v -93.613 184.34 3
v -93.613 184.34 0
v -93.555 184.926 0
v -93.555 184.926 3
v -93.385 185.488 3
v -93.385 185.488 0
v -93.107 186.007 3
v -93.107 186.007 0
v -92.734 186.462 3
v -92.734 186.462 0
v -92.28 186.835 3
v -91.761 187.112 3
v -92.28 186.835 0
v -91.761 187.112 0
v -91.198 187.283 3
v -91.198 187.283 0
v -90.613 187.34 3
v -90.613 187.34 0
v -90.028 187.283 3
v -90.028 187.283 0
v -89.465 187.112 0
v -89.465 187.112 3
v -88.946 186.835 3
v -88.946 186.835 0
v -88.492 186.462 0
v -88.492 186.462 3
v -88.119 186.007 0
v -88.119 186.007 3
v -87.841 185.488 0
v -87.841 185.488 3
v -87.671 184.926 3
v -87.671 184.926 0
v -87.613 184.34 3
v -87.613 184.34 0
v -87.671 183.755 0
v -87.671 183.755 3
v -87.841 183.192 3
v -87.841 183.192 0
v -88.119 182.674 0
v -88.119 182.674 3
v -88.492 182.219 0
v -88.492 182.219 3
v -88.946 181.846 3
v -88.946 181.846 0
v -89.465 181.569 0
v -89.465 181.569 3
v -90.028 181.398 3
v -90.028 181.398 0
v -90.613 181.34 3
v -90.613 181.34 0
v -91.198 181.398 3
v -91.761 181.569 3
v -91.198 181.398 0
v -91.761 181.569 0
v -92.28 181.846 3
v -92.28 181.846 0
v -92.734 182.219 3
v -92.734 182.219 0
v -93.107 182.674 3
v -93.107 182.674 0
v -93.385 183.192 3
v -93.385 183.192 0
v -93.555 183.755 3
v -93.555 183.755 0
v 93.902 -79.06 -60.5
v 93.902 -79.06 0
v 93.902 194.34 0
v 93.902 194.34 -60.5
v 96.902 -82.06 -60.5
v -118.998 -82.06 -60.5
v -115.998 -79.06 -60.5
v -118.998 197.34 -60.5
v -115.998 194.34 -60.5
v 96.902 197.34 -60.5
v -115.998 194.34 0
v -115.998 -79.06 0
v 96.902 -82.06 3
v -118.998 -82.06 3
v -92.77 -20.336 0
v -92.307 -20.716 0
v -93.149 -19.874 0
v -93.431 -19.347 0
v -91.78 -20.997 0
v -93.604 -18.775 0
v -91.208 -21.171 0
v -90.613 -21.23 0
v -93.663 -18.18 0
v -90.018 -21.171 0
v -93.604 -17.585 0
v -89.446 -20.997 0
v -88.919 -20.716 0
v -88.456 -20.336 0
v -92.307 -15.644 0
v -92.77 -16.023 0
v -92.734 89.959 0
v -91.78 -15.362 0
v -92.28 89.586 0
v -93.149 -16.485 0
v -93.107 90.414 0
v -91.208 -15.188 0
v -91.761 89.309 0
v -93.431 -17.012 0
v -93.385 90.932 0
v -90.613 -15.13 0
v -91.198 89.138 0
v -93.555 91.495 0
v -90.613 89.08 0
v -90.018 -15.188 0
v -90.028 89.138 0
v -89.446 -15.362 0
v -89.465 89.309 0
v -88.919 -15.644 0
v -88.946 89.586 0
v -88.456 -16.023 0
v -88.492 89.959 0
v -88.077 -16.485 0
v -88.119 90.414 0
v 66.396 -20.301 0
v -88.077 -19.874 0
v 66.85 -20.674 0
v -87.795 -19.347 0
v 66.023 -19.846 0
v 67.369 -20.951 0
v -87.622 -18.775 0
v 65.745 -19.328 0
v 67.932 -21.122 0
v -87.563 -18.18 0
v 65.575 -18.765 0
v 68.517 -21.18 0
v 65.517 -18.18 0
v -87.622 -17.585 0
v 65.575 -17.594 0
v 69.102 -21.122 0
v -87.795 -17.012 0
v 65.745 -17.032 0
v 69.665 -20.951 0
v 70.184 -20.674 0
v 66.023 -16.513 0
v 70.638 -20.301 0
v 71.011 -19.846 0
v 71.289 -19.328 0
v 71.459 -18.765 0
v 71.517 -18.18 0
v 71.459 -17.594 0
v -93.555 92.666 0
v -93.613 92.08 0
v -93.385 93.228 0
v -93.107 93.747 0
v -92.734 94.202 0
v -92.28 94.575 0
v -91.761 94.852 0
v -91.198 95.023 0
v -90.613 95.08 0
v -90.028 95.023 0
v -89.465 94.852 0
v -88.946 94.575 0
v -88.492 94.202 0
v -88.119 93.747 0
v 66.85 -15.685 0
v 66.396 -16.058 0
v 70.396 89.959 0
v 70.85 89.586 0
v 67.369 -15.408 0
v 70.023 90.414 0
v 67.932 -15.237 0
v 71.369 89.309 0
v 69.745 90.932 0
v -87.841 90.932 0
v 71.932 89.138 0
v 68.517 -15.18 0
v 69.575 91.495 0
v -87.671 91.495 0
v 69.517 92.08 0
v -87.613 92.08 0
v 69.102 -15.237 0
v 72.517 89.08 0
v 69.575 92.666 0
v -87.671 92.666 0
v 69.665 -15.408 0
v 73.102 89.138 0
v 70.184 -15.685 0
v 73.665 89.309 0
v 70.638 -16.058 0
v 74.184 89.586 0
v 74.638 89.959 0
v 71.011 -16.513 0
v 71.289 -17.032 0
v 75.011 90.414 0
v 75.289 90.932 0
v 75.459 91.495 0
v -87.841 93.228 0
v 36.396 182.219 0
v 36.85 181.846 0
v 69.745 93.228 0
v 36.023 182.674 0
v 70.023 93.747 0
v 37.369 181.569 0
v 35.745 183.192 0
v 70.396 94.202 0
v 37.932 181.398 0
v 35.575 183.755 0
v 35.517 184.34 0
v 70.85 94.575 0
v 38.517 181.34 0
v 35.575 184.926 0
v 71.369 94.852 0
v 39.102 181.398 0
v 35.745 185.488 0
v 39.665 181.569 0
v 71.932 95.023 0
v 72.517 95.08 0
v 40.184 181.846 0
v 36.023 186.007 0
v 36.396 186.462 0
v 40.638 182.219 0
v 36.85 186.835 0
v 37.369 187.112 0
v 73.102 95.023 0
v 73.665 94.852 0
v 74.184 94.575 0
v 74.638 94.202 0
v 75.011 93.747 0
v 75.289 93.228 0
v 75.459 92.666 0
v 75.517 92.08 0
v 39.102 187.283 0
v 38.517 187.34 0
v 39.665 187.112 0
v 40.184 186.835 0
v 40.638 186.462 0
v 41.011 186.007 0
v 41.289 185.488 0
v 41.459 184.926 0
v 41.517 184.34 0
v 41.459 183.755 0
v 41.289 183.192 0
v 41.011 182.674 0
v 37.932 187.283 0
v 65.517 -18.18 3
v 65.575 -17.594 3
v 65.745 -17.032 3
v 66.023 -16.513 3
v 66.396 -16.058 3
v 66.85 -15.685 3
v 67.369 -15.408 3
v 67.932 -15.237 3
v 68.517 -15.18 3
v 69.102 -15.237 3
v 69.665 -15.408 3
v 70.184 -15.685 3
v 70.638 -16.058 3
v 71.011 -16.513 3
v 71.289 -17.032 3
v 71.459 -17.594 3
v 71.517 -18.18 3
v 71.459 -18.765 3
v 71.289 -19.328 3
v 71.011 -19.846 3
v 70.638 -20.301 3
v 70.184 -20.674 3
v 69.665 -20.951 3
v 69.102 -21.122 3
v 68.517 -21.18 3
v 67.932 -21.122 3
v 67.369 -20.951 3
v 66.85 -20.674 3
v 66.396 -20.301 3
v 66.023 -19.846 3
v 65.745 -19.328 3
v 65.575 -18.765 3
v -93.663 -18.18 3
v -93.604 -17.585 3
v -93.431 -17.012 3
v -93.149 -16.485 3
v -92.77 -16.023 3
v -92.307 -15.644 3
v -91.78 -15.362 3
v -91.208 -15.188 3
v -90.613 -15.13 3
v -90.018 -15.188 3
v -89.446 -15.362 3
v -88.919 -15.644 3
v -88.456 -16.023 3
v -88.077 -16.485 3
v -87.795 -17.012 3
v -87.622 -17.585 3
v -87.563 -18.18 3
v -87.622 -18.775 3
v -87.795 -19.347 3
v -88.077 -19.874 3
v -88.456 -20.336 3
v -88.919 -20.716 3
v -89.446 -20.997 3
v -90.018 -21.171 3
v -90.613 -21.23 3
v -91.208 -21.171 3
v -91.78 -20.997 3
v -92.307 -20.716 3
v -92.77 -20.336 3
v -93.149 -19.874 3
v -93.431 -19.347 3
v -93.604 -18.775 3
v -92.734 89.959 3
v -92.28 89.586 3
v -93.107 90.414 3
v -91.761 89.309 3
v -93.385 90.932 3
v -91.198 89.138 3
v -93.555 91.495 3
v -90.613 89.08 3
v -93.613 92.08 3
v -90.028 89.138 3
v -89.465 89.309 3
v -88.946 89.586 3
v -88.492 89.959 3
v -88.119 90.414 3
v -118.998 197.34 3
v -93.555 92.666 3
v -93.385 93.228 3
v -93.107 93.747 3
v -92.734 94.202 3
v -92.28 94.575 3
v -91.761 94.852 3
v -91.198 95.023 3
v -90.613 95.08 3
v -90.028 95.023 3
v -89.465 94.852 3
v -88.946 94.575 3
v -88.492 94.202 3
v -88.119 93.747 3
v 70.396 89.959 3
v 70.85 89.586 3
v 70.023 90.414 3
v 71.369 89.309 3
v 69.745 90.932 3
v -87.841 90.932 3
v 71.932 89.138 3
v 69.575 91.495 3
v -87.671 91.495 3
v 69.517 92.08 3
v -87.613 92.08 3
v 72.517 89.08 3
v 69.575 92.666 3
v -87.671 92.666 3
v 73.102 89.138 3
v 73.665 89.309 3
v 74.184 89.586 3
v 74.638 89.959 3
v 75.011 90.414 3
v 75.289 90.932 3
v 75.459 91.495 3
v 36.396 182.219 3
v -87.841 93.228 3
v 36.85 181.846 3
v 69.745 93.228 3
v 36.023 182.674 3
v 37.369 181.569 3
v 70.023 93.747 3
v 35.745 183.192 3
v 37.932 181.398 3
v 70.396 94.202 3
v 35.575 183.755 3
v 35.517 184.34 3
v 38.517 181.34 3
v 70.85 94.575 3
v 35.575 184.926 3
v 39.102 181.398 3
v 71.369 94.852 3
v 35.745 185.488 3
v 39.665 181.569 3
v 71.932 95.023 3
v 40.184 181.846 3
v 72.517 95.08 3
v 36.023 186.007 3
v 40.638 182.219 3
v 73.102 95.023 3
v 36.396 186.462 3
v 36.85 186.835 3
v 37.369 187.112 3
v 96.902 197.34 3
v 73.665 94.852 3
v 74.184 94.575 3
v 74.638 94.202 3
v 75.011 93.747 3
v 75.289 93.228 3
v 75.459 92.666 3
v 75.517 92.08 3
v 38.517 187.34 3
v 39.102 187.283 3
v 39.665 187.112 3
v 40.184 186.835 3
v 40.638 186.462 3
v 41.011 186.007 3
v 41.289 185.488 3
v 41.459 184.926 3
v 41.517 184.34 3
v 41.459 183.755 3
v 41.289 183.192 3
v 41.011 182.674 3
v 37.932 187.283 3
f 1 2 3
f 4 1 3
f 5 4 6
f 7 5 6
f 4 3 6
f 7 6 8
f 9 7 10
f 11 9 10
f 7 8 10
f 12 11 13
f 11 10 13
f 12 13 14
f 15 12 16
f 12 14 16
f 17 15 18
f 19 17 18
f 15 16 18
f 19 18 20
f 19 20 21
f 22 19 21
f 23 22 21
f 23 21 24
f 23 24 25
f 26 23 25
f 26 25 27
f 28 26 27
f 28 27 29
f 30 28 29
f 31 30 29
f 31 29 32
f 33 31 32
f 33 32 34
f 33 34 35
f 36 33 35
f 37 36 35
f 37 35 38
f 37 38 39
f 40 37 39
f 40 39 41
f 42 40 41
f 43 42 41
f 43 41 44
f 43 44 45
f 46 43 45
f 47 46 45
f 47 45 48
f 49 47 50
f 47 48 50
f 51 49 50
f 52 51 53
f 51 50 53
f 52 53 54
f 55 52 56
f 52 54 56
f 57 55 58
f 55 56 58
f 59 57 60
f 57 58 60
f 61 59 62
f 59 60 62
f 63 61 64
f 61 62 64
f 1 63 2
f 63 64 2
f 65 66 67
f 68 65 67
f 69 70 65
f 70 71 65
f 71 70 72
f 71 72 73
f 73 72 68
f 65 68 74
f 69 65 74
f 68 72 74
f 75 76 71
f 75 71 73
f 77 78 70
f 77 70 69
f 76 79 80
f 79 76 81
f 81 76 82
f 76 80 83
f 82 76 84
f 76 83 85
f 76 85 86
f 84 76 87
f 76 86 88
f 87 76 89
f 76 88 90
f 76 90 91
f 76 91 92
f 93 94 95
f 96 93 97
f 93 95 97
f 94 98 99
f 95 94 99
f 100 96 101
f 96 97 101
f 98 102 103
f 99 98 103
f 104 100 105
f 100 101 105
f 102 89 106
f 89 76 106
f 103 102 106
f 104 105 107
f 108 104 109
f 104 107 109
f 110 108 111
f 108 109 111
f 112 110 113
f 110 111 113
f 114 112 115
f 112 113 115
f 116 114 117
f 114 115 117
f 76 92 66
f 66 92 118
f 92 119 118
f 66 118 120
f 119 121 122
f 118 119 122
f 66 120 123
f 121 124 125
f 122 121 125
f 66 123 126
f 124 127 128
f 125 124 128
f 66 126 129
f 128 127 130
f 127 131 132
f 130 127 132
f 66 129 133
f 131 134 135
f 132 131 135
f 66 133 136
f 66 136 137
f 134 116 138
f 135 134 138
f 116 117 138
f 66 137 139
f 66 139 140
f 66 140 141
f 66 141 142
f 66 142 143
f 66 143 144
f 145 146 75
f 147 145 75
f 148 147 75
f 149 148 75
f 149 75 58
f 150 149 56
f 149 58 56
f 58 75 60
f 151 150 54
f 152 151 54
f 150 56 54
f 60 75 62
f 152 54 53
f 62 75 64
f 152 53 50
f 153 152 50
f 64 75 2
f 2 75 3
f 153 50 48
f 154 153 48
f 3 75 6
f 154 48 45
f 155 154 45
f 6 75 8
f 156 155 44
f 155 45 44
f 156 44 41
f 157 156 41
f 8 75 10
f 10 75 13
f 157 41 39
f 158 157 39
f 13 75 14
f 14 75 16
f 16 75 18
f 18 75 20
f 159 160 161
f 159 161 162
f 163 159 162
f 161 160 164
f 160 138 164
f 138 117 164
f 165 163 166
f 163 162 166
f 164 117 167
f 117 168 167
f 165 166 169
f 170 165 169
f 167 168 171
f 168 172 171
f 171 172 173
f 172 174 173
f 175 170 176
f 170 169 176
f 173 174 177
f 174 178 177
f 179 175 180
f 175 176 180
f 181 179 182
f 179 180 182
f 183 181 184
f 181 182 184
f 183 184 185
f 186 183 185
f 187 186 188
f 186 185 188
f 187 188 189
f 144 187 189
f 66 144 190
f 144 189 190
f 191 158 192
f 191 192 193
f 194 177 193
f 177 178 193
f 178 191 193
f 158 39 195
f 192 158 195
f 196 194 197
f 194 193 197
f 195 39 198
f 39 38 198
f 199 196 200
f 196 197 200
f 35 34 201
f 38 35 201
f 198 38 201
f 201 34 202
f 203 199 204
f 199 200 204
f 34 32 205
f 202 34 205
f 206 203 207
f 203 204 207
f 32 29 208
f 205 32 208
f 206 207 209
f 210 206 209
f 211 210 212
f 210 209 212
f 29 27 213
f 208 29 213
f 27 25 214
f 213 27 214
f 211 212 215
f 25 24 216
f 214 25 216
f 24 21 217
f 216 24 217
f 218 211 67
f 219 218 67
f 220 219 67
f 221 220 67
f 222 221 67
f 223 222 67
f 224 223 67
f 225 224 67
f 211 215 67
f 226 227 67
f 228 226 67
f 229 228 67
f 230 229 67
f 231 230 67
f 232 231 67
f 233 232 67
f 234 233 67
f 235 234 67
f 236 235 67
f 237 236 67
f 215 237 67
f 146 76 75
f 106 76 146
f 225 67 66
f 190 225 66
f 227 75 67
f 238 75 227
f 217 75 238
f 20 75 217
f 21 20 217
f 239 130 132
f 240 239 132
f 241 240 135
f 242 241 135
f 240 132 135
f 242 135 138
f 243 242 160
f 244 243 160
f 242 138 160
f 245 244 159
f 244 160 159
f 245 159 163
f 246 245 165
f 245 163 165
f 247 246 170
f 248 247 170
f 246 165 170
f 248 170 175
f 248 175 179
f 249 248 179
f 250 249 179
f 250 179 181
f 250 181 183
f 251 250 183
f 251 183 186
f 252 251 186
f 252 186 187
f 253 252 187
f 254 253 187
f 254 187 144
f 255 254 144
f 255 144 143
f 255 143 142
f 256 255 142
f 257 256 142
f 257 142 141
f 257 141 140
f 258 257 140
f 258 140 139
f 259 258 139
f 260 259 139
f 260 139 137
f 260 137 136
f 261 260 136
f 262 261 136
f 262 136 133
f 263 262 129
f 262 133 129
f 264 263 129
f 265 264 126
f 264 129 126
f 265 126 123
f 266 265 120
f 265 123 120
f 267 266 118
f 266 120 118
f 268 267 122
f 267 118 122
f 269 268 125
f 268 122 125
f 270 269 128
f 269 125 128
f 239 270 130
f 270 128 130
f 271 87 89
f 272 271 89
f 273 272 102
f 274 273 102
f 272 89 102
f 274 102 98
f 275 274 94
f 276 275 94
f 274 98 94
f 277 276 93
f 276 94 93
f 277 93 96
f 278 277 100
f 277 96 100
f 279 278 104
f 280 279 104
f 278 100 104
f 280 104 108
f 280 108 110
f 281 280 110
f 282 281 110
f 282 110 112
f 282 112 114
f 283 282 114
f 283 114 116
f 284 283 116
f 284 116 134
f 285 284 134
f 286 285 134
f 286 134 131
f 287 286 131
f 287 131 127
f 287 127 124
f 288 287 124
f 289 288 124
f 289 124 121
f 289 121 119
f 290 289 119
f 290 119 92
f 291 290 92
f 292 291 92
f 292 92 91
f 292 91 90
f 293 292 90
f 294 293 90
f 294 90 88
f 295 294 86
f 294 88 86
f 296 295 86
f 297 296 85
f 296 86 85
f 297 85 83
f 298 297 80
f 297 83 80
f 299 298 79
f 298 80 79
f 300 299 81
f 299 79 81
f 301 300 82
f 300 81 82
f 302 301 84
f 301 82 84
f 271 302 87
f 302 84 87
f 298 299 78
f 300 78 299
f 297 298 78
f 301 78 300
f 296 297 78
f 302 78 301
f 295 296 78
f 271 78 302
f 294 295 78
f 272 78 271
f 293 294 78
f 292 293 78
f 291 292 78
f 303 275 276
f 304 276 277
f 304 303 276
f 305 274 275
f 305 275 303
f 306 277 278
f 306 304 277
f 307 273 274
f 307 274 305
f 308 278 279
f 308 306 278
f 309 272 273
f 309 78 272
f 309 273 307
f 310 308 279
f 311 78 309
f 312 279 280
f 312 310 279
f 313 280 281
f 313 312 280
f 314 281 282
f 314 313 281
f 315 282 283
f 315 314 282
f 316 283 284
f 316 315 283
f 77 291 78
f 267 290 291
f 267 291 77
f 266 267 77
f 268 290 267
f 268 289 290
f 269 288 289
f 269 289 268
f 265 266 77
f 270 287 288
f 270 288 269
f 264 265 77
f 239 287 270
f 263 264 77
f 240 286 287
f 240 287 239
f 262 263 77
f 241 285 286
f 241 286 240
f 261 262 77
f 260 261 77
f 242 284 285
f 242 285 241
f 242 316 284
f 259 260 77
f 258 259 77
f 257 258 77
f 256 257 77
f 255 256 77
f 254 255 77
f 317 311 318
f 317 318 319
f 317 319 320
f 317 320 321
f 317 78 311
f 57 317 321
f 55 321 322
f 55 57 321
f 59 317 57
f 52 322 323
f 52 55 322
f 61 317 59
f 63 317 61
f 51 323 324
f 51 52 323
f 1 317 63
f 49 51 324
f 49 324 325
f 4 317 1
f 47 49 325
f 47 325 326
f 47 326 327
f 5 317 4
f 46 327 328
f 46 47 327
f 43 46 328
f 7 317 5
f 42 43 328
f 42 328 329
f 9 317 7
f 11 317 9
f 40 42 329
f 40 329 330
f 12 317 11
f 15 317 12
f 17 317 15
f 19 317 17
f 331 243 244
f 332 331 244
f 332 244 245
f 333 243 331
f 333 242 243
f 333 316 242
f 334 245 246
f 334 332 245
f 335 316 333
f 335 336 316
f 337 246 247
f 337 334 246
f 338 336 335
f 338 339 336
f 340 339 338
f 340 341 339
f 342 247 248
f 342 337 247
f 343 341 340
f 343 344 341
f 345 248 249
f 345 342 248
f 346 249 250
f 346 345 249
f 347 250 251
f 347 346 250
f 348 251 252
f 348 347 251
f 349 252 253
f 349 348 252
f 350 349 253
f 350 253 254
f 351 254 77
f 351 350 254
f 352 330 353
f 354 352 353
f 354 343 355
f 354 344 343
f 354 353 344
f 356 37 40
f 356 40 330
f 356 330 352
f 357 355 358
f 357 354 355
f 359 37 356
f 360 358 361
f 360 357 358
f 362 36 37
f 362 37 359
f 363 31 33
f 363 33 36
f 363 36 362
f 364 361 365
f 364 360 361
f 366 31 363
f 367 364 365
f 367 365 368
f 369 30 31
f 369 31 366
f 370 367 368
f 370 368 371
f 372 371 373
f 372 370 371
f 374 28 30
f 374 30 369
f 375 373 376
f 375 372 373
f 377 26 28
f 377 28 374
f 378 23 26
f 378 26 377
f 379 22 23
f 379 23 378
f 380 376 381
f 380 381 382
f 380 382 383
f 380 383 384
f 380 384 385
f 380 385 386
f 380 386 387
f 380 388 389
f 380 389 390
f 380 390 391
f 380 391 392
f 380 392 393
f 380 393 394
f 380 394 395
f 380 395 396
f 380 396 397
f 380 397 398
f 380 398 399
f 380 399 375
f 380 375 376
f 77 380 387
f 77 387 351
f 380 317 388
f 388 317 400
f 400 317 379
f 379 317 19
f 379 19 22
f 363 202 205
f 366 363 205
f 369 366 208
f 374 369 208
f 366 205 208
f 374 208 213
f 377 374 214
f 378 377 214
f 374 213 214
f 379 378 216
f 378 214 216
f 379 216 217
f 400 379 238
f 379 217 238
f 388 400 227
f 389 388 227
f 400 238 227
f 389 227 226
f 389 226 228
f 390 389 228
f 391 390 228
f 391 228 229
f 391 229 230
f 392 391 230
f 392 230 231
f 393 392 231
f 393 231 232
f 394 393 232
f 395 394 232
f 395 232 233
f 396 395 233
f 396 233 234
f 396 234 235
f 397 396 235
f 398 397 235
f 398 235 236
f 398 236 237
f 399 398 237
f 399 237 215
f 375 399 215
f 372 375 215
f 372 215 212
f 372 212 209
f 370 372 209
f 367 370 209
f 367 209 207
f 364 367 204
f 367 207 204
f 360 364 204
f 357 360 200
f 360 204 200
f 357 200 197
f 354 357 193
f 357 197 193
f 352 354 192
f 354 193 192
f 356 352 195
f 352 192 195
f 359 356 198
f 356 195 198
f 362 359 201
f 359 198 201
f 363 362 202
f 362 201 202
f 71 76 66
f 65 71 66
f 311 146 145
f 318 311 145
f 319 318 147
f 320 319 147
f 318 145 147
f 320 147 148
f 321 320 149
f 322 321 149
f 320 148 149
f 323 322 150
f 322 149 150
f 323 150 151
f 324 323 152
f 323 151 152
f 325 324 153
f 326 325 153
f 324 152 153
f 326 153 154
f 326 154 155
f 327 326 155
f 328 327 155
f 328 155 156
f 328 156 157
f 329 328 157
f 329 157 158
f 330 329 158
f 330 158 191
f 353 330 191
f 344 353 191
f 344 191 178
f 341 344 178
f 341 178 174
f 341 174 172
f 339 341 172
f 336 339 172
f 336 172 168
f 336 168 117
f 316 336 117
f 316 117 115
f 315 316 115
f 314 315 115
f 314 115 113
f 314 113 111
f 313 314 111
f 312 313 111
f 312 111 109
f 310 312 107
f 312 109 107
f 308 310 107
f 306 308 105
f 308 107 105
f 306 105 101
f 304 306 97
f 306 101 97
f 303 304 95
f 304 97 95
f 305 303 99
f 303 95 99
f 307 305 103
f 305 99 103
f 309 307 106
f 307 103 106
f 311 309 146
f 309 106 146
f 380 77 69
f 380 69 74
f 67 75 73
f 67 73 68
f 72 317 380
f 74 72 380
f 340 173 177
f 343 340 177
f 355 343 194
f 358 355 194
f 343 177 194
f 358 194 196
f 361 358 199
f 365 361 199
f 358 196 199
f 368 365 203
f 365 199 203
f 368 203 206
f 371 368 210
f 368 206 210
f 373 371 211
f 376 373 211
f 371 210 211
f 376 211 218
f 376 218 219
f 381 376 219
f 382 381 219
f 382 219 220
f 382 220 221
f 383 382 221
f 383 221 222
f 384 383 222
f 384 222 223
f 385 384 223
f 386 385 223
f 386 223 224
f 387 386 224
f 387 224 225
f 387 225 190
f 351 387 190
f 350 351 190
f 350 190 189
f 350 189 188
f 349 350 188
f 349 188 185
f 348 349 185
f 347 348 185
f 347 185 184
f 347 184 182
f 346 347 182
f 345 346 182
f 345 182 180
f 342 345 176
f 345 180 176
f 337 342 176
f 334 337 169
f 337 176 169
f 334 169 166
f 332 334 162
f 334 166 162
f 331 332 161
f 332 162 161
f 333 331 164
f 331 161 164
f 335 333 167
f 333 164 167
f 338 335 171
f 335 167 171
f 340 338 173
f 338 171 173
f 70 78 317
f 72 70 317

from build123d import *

# Parameters (mm, degrees)
SKETCH1_W           = 215.9
SKETCH1_H           = 279.4
BOSS_EXTRUDE1_DEPTH = 3
SKETCH2_W           = 215.9
SKETCH2_H           = 279.4
SKETCH2_W_2         = 209.9
SKETCH2_H_2         = 273.4
BOSS_EXTRUDE2_DEPTH = 63.5
SKETCH3_R           = 3
SKETCH3_R_2         = 3.05
CUT_EXTRUDE3_DEPTH  = 5


with BuildPart() as part:
    # Sketch1 → Boss-Extrude1 (new body)
    with BuildSketch(Plane.XY):
        with Locations((-11.047990366, 57.640345361)):
            Rectangle(SKETCH1_W, SKETCH1_H)
    extrude(amount=BOSS_EXTRUDE1_DEPTH)

    # Sketch2 → Boss-Extrude2 (add)
    with BuildSketch(Plane.XY.offset(3)):
        with Locations((-11.047990366, 57.640345361)):
            Rectangle(SKETCH2_W, SKETCH2_H)
        with Locations((-11.047990366, 57.640345361)):
            Rectangle(SKETCH2_W_2, SKETCH2_H_2, mode=Mode.SUBTRACT)
    extrude(amount=-BOSS_EXTRUDE2_DEPTH)

    # Sketch3 → Cut-Extrude3 (cut)
    with BuildSketch(Plane(origin=(0, 0, 0), x_dir=(-1, 0, 0), z_dir=(0, 0, -1))):
        with Locations((-68.517009634, -18.179654639)):
            Circle(SKETCH3_R)
        with Locations((-72.517009634, 92.080345361)):
            Circle(SKETCH3_R)
        with Locations((-38.517009634, 184.340345361)):
            Circle(SKETCH3_R)
        with Locations((90.612990366, 92.080345361)):
            Circle(SKETCH3_R)
        with Locations((-58.712009634, -93.094201664)):
            Circle(SKETCH3_R)
        with Locations((90.612990366, 184.340345361)):
            Circle(SKETCH3_R)
        with Locations((90.612990366, -18.179654639)):
            Circle(SKETCH3_R_2)
    extrude(amount=-CUT_EXTRUDE3_DEPTH, mode=Mode.SUBTRACT)


solid = part.part
